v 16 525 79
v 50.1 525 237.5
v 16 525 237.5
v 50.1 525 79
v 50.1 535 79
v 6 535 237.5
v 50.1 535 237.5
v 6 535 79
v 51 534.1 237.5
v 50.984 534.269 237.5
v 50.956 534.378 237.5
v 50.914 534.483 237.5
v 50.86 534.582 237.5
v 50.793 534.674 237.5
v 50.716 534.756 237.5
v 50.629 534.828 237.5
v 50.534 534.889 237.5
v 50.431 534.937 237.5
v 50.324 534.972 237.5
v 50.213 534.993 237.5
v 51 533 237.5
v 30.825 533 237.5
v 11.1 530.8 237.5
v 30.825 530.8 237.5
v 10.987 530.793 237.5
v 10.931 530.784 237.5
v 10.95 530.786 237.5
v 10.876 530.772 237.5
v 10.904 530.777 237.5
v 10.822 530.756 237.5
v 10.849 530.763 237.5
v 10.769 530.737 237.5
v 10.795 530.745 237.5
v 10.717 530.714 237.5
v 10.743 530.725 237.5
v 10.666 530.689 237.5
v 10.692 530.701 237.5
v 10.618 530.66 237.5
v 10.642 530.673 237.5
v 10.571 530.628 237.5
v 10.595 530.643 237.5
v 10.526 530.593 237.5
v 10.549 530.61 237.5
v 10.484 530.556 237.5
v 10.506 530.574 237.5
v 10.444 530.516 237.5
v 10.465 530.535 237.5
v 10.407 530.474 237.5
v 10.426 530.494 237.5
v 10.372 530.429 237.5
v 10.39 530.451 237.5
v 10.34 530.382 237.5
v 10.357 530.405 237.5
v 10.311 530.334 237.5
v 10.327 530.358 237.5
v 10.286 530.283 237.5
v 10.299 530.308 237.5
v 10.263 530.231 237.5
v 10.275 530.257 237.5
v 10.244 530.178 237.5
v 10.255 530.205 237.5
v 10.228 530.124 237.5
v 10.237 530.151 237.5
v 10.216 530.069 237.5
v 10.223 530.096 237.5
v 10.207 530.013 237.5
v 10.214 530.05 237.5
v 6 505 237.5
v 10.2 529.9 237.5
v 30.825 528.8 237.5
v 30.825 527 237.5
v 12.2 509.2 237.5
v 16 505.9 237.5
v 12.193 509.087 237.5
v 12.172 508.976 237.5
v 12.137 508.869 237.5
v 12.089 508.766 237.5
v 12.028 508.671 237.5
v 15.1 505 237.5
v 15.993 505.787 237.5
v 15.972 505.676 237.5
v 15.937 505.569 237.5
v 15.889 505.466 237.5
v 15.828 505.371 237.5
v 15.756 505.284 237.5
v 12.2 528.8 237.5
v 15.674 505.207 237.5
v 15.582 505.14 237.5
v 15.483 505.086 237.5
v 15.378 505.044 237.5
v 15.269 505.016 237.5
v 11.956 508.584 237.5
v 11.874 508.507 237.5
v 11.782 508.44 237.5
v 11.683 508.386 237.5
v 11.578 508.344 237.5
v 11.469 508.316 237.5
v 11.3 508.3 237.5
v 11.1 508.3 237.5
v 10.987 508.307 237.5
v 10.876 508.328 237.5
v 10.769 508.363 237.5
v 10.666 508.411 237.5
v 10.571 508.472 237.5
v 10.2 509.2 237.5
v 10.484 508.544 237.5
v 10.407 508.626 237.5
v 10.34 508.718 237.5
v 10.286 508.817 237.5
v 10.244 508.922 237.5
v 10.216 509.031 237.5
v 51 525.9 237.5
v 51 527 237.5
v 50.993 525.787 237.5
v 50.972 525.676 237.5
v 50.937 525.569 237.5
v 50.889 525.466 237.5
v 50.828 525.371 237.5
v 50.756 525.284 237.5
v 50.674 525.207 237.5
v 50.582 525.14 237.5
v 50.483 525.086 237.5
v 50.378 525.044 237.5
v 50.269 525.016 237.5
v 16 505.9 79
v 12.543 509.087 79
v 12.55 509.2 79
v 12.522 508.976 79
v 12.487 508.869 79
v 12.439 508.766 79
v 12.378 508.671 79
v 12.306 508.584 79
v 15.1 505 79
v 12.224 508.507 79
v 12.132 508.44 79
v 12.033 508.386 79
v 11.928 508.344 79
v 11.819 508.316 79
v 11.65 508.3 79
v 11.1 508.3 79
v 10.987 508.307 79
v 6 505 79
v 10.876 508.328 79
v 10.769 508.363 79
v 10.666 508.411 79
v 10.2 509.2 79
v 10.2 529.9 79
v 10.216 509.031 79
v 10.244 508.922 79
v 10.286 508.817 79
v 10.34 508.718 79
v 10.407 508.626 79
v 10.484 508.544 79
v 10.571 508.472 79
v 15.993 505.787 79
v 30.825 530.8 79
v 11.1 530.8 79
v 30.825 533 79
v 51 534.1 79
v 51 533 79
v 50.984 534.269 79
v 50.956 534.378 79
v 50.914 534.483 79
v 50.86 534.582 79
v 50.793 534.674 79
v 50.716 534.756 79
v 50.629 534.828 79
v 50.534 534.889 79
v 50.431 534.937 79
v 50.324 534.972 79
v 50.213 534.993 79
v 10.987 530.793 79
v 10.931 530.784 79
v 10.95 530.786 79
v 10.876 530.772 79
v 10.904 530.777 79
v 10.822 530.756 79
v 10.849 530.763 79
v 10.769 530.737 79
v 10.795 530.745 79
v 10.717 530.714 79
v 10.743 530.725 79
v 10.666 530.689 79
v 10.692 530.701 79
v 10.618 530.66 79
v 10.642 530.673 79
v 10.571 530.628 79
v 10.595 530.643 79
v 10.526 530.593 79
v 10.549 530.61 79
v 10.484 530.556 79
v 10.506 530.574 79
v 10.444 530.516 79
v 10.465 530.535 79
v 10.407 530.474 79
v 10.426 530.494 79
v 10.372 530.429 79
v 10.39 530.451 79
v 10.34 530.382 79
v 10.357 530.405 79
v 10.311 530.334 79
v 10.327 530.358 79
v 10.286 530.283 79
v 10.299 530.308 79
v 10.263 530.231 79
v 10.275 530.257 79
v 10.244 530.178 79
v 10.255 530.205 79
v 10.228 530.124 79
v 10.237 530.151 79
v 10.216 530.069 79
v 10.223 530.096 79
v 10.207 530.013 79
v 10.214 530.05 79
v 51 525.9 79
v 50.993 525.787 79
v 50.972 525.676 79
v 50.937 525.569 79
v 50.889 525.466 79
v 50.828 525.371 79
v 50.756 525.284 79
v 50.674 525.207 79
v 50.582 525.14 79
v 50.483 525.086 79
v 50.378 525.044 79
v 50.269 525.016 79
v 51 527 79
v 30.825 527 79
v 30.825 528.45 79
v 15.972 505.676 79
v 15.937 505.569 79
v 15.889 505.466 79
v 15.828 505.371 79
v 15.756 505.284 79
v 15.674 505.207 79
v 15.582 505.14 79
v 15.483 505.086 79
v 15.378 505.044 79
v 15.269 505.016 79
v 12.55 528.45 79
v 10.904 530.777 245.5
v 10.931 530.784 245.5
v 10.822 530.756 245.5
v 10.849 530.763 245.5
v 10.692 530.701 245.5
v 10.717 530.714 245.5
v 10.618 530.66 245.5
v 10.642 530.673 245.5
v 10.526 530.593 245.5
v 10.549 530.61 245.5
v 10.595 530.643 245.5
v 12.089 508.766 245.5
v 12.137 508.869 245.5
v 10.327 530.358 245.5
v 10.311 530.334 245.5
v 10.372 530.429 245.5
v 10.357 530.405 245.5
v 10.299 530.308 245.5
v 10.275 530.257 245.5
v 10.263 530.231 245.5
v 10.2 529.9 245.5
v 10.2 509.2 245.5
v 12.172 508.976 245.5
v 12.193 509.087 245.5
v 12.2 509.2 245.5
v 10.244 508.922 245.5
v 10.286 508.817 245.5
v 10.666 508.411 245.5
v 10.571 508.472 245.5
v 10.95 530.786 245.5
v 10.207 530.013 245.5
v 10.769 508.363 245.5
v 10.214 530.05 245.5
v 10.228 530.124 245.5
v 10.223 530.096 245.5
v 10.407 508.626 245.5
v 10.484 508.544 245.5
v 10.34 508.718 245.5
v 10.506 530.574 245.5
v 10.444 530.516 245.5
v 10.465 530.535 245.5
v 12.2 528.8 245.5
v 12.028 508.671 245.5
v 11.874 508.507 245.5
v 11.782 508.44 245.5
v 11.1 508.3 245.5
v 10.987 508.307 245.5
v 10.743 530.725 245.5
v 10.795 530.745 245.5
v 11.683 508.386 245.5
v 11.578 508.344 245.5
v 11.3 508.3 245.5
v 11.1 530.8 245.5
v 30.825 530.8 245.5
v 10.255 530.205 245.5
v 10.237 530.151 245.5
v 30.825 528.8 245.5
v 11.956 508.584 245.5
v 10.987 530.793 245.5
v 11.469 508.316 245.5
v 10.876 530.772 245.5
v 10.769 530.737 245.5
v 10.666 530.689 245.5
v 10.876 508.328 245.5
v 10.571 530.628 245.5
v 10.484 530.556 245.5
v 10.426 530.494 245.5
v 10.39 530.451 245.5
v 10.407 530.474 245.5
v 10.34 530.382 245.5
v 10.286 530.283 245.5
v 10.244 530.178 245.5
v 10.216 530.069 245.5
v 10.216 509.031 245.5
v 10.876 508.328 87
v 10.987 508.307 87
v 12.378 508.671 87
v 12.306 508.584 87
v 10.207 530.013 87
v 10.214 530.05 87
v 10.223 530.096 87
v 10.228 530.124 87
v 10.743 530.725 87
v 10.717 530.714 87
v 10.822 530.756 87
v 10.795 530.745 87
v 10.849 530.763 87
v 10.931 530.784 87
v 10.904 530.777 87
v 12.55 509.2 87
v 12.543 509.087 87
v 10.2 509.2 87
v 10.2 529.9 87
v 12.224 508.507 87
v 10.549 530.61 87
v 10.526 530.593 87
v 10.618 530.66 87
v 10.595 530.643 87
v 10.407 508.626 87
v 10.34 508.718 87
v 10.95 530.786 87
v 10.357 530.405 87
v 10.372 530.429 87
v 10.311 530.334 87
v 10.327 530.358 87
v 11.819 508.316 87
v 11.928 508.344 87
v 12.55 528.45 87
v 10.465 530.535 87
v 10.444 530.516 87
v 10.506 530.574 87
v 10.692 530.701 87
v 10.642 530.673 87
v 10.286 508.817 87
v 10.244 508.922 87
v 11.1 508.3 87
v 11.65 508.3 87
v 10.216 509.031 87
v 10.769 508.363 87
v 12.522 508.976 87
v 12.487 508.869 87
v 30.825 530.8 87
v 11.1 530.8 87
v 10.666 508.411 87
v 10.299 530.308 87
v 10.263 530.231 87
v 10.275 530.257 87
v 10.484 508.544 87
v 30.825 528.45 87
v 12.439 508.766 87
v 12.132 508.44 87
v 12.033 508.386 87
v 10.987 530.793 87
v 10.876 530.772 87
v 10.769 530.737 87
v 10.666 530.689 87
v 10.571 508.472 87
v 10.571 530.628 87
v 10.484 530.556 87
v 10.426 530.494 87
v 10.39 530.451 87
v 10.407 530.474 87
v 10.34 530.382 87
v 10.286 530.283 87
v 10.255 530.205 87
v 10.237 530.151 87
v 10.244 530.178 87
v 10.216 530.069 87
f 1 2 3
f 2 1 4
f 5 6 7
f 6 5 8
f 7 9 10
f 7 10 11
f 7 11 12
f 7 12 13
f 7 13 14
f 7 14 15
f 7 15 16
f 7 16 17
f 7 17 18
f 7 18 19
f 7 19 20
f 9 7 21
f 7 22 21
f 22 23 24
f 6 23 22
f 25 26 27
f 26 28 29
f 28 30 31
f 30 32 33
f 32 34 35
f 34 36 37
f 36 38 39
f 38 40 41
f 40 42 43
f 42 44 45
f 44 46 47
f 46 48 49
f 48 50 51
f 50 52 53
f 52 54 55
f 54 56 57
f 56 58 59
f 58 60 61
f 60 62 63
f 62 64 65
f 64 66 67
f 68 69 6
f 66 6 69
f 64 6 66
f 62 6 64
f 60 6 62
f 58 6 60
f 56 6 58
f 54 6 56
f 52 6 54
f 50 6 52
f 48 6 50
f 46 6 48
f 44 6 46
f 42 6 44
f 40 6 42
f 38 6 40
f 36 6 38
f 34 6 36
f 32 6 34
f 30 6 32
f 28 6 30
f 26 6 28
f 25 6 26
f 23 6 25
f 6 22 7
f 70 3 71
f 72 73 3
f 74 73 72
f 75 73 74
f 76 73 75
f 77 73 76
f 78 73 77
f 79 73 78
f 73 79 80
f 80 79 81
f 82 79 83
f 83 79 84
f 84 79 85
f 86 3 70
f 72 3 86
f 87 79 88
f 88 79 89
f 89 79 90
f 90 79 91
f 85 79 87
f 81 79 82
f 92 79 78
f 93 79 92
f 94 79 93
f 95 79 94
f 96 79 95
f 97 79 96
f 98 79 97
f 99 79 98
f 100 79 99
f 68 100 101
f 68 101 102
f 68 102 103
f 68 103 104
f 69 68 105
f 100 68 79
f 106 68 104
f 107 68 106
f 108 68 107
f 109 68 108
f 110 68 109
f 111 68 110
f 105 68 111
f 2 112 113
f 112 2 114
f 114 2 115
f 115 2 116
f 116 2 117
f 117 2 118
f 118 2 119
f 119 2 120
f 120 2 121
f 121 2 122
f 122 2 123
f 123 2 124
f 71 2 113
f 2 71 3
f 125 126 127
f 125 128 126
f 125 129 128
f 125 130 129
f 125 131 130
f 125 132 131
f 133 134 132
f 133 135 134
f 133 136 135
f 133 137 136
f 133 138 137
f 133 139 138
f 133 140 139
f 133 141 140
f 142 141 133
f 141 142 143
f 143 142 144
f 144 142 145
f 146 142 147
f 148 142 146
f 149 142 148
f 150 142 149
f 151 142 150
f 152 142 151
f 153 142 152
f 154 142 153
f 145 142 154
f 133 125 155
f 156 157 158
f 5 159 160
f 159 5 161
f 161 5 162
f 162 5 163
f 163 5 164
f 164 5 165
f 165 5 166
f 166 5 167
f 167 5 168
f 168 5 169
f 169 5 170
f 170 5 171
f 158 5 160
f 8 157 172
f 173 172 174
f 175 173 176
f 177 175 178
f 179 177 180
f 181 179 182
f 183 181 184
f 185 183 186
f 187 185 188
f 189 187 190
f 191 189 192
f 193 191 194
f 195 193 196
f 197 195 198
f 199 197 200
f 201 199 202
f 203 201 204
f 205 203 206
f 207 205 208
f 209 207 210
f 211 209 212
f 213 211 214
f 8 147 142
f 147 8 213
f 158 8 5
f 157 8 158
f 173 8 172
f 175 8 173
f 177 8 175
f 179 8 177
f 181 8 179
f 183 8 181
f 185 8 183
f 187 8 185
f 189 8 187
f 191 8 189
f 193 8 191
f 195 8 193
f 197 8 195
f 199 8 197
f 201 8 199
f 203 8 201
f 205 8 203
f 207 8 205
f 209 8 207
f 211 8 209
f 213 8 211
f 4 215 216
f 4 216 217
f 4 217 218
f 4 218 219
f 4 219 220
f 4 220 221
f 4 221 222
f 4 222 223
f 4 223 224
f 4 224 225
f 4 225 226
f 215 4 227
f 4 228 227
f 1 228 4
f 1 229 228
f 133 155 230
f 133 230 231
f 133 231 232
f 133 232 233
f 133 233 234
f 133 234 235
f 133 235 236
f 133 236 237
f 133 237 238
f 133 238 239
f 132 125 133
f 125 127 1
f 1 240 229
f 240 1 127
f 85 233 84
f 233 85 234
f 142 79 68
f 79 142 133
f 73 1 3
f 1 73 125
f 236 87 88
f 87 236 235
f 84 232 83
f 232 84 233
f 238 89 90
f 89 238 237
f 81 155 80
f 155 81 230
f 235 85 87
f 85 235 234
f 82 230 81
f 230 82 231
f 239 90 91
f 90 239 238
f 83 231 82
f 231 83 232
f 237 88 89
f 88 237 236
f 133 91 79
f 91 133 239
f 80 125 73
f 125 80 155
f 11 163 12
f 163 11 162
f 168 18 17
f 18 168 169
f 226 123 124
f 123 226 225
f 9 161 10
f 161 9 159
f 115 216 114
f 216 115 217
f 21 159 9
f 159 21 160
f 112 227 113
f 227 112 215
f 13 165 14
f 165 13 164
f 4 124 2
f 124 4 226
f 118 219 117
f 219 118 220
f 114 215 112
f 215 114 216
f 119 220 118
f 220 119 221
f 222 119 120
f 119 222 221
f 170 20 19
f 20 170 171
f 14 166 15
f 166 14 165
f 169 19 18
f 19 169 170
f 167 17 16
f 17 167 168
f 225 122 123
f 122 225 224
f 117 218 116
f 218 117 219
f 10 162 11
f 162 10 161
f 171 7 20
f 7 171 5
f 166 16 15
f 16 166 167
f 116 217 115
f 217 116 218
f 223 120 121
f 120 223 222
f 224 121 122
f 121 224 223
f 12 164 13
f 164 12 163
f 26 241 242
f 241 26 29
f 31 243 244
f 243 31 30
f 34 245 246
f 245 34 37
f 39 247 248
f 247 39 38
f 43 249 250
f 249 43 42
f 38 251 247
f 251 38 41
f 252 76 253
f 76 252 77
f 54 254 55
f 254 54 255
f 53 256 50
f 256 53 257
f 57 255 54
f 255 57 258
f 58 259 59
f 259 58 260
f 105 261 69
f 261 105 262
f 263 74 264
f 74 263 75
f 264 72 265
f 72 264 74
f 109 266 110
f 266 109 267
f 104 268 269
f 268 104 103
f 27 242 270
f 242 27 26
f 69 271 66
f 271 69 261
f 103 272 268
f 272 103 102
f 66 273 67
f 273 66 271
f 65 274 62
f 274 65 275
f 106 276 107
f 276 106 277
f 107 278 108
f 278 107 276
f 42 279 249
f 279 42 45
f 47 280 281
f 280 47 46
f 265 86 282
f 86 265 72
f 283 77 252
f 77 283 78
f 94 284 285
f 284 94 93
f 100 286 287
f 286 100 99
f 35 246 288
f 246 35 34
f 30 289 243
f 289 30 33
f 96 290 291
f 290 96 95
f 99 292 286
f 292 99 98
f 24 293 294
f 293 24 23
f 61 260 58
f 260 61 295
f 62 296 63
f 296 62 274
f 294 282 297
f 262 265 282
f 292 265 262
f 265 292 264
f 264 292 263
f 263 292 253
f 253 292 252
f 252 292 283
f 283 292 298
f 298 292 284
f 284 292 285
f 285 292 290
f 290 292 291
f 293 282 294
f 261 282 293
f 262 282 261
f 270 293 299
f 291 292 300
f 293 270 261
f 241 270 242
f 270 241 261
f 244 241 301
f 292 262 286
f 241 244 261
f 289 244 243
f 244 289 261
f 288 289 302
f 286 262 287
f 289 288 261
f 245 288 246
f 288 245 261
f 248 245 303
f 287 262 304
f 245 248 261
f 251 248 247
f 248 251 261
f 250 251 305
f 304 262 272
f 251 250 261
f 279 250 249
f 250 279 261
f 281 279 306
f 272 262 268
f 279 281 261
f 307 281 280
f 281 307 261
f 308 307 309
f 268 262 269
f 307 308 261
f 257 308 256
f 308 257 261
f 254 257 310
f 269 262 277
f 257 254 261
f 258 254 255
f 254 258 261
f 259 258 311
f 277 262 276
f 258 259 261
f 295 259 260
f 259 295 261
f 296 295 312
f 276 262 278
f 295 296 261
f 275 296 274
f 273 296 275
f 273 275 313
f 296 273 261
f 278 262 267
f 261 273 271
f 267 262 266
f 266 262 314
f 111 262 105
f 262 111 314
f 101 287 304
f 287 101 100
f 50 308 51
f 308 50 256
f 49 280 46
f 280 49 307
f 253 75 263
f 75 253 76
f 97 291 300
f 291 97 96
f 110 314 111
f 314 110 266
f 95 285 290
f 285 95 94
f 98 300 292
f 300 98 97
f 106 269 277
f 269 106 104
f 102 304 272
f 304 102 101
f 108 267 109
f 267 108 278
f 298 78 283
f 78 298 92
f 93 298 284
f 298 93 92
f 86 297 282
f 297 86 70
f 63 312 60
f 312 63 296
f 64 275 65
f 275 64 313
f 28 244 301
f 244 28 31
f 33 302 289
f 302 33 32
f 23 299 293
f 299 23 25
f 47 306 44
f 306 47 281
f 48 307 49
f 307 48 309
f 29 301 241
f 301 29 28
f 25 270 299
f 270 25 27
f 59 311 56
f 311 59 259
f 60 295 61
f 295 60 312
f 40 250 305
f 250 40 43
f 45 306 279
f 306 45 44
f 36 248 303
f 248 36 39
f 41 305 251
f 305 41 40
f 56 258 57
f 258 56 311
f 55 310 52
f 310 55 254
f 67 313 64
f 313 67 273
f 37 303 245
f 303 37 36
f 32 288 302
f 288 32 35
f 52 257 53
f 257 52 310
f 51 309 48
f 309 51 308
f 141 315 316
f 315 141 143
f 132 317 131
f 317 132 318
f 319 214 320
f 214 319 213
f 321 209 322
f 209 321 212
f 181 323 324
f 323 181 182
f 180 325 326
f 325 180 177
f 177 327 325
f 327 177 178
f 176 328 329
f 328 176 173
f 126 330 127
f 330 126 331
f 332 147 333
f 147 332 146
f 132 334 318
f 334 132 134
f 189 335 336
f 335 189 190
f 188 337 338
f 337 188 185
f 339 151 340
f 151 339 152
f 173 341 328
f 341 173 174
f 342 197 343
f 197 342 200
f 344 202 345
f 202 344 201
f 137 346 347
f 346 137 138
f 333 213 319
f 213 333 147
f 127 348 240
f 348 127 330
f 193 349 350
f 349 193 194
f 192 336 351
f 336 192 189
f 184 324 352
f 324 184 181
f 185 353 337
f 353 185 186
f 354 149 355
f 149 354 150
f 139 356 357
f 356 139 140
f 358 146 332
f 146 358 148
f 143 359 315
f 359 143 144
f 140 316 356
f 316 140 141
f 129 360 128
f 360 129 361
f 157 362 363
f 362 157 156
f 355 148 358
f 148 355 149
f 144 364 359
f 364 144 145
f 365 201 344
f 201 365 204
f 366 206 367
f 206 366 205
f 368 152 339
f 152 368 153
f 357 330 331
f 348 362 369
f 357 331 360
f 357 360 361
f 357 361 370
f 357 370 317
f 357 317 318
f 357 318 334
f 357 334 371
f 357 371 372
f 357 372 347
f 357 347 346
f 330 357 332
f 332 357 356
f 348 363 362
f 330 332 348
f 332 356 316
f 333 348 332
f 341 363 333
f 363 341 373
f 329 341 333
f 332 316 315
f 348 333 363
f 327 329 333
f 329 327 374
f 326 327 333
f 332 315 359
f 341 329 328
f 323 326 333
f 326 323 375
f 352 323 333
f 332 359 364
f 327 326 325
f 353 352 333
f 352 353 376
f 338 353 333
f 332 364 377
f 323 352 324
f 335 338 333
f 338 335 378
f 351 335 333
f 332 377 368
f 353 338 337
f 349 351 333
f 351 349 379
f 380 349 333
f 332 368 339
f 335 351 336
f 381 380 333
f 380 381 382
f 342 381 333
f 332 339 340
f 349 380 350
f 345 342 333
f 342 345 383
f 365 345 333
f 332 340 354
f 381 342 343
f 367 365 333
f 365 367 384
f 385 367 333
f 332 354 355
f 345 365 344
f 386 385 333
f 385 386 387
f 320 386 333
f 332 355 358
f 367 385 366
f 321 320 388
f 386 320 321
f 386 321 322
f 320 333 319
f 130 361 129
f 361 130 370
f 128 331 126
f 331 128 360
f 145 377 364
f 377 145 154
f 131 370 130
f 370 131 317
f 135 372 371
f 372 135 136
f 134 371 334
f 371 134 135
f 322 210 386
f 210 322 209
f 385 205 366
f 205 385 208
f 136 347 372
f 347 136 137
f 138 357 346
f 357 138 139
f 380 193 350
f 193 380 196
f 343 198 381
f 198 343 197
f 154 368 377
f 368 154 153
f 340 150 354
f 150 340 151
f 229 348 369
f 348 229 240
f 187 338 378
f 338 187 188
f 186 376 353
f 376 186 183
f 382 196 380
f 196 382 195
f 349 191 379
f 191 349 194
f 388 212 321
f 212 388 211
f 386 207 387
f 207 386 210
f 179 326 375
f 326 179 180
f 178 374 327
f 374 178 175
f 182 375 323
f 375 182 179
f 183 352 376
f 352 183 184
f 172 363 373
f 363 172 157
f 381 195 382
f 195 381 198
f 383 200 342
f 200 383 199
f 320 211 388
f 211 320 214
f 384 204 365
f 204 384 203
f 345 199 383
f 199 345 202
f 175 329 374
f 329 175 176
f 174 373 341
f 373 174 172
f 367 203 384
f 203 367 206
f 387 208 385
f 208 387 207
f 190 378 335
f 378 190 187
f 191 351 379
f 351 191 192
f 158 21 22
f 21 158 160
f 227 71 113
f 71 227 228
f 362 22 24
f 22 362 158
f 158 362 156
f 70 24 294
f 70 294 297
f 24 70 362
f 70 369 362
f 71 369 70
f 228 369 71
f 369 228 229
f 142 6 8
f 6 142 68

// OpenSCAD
// file: construction.scad
/*
Specialized construction functions specifically for the enclosure.
By combining these operators the various instances of enclosure pieces 
can be constructed.
*/
include <parameters.scad>;
use <utility.scad>;

module interlock() {
    ra = knob_diameter/2;
    rb = lug_diameter/2;
    
    color("DarkSeaGreen")
        rotate([0,90,90]) 
            rotate_extrude()
                polygon([[0,0],[0,lug_height],[rb,lug_height],
                    [rb,2.5],[ra,1],[ra,0]]);
}

// extend the corner frame to be symmetrical with the front corner
module extend_frame_x(height=frame_corner_height) {
    union() {
        children(0);
        translate([hinge_inner_diameter*2, hinge_inner_diameter,0]) 
            rotate([0,0,-90])
                frame( hinge_inner_diameter*3+1, 
                    height, hinge_inner_diameter, 
                    corner_roundness );
    }
}

module frame( width, height, thickness, roundness ) {
    color("SteelBlue") 
        linear_extrude(height=height)
            apply_roundness(roundness, $fs =0.01) 
                    square( [thickness, width] );
}

module frame_corner( width, height, thickness, roundness ) {    
    union() {
        mirror([0,1,0]) 
            rotate([0,0,-90])
                frame( width, height, thickness, roundness );
        frame( width, height, thickness + panel_thickness, roundness );
    }   
}

module frame_connector_corner(clearance=0) {
    translate([panel_thickness*1.7,panel_thickness*0.70, 0]) 
        color("SteelBlue") cornerize()
            frame( frame_corner_width*0.75, frame_connector_depth, 
                frame_thickness*.20+clearance, corner_roundness );
        
}

module add_lugs() {   
    union() {
        children(0);

        translate([interlock_offset_x,-lug_height,interlock_offset_z]) 
            interlock();

        translate([interlock_offset_x,-lug_height,
                interlock_offset_z+interlock_gap])
            interlock(); 
    } 
}

module add_connector(height=frame_corner_height) {
    union() {
        children(0);
        translate([0,0,height])
            frame_connector_corner();
    }
}

module add_hinge_post( top=false ) {
    union() {
        difference() {
            children(0);
            // create a negative space that snuggly fits the hinge
            translate([frame_corner_width+plastic_thickness+hinge_gap,
                hinge_inner_diameter/2, (top?frame_corner_height:0)])
                mirror(top?[0,0,1]:[0,0,0])
                    union() {
                        height = hinge_height-hinge_inner_diameter;
                        translate([0,0,height/2]) 
                            cube([hinge_inner_diameter+2,
                                hinge_inner_diameter+2,height+0.2],true);
                        
                        rotate([0,0,-90]) 
                            translate([0,0,-1.4]) 
                                scale([1.1,1.1,1.1]) hinge();
                    }
            
        }
        color("SteelBlue")
            translate([frame_corner_width+plastic_thickness+hinge_gap,hinge_inner_diameter/2,0])
                cylinder(d=hinge_inner_diameter, frame_corner_height);
    }
}

module add_outside_frame( height ) {
    color("SteelBlue")
    union() {
        children(0);
        translate([-plastic_thickness,-plastic_thickness,0])
            frame( frame_corner_width+plastic_thickness, height, frame_thickness,
                corner_roundness);
        translate([14.5,0.05,height/2])
            rotate([0,0,8])
            cube([frame_corner_width/2,plastic_thickness,height],true);
    }
}

module hinge() {
    height = hinge_height-hinge_inner_diameter;
    width = hinge_inner_diameter+hinge_ring_thickness;
    difference() {
        
        // create the base shape for the hinge
        color("Salmon") union() {
            
            cylinder(d=width, height);
            
            translate([hinge_inner_diameter*3+hinge_clearance,
                -hinge_offset,height/2-plastic_thickness/2]) 
                cube([hinge_length,hinge_thickness,
                    height+plastic_thickness],true);
           
            translate([2.52,-5.2,height/2]) 
                rotate([0,0,40]) 
                    cube([hinge_inner_diameter,
                        width+1,height],true);
        }
        
        // remove a hole for the hinge post to slide into
        cylinder(d=hinge_inner_diameter+tolerance_smooth, height+1);
        
        // trim the left corner
        translate([4,-17.5,height/2-1]) 
            rotate([0,0,145]) 
                cube([50,width-2,height+3],true);
        
        // smooth the tranistion to the bottom edge
        translate([19,-10,height/2-17.85]) 
            rotate([-88.5,0.1,96]) 
                cube([40,20,100],true);
        
        // add a chamfer to right corner
        translate([hinge_length+8,0,height+25]) 
            rotate([0,45,0]) 
            cube(50,true);
    }   
}

module add_connector_slot() {
    difference() {
        children(0);
        frame_connector_corner(tolerance_tight);
    }
}

module frame_vertical() {
    add_connector_slot()
    add_connector(frame_vertical_height)
    extend_frame_x(frame_vertical_height)
        frame_corner( frame_corner_width, 
            frame_vertical_height, frame_thickness, 
            corner_roundness );          
}
// file: support.scad
/*
Provides support objects that are used to model the environment of the enclosure
to ensure the pieces slot together and fit properly.
*/
include <parameters.scad>;
use <utility.scad>;

module wall_panel() {
    cube([panel_height,panel_width,panel_thickness]);
}

module door_panel() {
     cube([door_panel_width,door_panel_height,door_panel_thickness]);
}

module left_wall_panel() {
    translate([panel_thickness,0,panel_offset_z]) 
        rotate([0,-90,0]) 
            wall_panel();
}

module back_wall_panel() {
    translate([(enclosure_width-panel_width)/2,
            enclosure_depth-panel_thickness-plastic_thickness,
            panel_offset_z]) 
        rotate([-90,-90,0]) 
            wall_panel();
}

module right_wall_panel() {
    translate([enclosure_width,0,panel_offset_z]) 
        rotate([0,-90,0]) 
            wall_panel();
}

module left_door(open=false) {
    translate([frame_corner_width+plastic_thickness+hinge_gap,
            hinge_inner_diameter/2,0]) 
        rotate([90,0,open?-90:0]) 
            translate([door_hinge_offset,0,hinge_offset-
                    door_panel_thickness/2])
                door_panel();
}

module right_door(open=false) {
    translate([enclosure_width,0,0])  
        mirror([1,0,0]) left_door(open);
}
// file: utility.scad
/*
Generically useful utility functions.
*/

// applies roundness without altering dimensions of object
module apply_roundness(r)
    offset(r) offset(delta=-r) children(0);

// makes a corner piece by mirroring and rotating one side
module cornerize() {
    union() {
        children(0);
        mirror([0,1,0]) 
            rotate([0,0,-90])
                children(0);
    }
} 

/*
 The fix_preview series of functions are used to make small
 translations in order to reduce conincident plane artifacts
 from the preview mode. 

 It would be nice to have just one module for this but I haven't
 figured out a way of doing this generically - so the following
 uses a small translation in different directions depending on
 the use case needed.
*/
module fix_preview() {
    translate($preview?[-0.001,-0.001,-0.001]:[0,0,0])
        children(0);
}

module fix_preview2() {
    translate($preview?[-0.001,0.001,-0.001]:[0,0,0])
        children(0);
}

module fix_preview3() {
    translate($preview?[-0.001,0.001,0.001]:[0,0,0])
        children(0);
}
// file: parameters.scad
$fn=50;

// Wall thickness and tolerance
plastic_thickness=2.0;
tolerance_smooth=0.45;
tolerance_tight=0.35;

// Specify enclosure dimensions
enclosure_height=475.0;
enclosure_depth=535.0;

// Wall panel dimensions
panel_thickness=6.0;
panel_height=450.0;
panel_width=535.0;
panel_offset_z = enclosure_height - panel_height;

// Door panel dimensions
door_panel_thickness=3.0;
door_panel_width=250.0;
door_panel_height=475.0;
door_hinge_offset=6.5;

// Frame
frame_corner_width=30.0;
frame_corner_height=79.0;
frame_thickness = plastic_thickness*2 + panel_thickness;
frame_side = (enclosure_height - frame_corner_height*2)/2;
frame_clip_height=50.5;
corner_roundness=0.9;
frame_vertical_height = (enclosure_height-frame_corner_height*2)/2;
frame_connector_depth = 8.0;

// Interlock
knob_diameter=9.8;
lug_diameter=6.2;
lug_gap=1.4;
lug_height = lug_gap+2.15;
interlock_offset_x=15.0;
interlock_offset_z=27.0;
interlock_gap=32;

// Door hinge
hinge_inner_diameter=10;
hinge_height=25;
hinge_length=53;
hinge_gap = 9.6;
hinge_clearance = 1.5;
hinge_ring_thickness=3.0;
hinge_thickness=plastic_thickness*2 + door_panel_thickness;
hinge_offset=6.5+plastic_thickness;

enclosure_width=2*(frame_corner_width+plastic_thickness+hinge_gap
    +door_hinge_offset) + door_panel_width*2 +tolerance_smooth;
// main file
include <parameters.scad>
use <utility.scad>
use <support.scad>
use <construction.scad>

module back_left_vertical_a() {
    difference() {
        translate([0,enclosure_depth,frame_corner_height])
            mirror([0,1,0])
                frame_vertical();
        fix_preview() back_wall_panel();
        fix_preview() left_wall_panel();
    }
}

%back_wall_panel();
back_left_vertical_a();
